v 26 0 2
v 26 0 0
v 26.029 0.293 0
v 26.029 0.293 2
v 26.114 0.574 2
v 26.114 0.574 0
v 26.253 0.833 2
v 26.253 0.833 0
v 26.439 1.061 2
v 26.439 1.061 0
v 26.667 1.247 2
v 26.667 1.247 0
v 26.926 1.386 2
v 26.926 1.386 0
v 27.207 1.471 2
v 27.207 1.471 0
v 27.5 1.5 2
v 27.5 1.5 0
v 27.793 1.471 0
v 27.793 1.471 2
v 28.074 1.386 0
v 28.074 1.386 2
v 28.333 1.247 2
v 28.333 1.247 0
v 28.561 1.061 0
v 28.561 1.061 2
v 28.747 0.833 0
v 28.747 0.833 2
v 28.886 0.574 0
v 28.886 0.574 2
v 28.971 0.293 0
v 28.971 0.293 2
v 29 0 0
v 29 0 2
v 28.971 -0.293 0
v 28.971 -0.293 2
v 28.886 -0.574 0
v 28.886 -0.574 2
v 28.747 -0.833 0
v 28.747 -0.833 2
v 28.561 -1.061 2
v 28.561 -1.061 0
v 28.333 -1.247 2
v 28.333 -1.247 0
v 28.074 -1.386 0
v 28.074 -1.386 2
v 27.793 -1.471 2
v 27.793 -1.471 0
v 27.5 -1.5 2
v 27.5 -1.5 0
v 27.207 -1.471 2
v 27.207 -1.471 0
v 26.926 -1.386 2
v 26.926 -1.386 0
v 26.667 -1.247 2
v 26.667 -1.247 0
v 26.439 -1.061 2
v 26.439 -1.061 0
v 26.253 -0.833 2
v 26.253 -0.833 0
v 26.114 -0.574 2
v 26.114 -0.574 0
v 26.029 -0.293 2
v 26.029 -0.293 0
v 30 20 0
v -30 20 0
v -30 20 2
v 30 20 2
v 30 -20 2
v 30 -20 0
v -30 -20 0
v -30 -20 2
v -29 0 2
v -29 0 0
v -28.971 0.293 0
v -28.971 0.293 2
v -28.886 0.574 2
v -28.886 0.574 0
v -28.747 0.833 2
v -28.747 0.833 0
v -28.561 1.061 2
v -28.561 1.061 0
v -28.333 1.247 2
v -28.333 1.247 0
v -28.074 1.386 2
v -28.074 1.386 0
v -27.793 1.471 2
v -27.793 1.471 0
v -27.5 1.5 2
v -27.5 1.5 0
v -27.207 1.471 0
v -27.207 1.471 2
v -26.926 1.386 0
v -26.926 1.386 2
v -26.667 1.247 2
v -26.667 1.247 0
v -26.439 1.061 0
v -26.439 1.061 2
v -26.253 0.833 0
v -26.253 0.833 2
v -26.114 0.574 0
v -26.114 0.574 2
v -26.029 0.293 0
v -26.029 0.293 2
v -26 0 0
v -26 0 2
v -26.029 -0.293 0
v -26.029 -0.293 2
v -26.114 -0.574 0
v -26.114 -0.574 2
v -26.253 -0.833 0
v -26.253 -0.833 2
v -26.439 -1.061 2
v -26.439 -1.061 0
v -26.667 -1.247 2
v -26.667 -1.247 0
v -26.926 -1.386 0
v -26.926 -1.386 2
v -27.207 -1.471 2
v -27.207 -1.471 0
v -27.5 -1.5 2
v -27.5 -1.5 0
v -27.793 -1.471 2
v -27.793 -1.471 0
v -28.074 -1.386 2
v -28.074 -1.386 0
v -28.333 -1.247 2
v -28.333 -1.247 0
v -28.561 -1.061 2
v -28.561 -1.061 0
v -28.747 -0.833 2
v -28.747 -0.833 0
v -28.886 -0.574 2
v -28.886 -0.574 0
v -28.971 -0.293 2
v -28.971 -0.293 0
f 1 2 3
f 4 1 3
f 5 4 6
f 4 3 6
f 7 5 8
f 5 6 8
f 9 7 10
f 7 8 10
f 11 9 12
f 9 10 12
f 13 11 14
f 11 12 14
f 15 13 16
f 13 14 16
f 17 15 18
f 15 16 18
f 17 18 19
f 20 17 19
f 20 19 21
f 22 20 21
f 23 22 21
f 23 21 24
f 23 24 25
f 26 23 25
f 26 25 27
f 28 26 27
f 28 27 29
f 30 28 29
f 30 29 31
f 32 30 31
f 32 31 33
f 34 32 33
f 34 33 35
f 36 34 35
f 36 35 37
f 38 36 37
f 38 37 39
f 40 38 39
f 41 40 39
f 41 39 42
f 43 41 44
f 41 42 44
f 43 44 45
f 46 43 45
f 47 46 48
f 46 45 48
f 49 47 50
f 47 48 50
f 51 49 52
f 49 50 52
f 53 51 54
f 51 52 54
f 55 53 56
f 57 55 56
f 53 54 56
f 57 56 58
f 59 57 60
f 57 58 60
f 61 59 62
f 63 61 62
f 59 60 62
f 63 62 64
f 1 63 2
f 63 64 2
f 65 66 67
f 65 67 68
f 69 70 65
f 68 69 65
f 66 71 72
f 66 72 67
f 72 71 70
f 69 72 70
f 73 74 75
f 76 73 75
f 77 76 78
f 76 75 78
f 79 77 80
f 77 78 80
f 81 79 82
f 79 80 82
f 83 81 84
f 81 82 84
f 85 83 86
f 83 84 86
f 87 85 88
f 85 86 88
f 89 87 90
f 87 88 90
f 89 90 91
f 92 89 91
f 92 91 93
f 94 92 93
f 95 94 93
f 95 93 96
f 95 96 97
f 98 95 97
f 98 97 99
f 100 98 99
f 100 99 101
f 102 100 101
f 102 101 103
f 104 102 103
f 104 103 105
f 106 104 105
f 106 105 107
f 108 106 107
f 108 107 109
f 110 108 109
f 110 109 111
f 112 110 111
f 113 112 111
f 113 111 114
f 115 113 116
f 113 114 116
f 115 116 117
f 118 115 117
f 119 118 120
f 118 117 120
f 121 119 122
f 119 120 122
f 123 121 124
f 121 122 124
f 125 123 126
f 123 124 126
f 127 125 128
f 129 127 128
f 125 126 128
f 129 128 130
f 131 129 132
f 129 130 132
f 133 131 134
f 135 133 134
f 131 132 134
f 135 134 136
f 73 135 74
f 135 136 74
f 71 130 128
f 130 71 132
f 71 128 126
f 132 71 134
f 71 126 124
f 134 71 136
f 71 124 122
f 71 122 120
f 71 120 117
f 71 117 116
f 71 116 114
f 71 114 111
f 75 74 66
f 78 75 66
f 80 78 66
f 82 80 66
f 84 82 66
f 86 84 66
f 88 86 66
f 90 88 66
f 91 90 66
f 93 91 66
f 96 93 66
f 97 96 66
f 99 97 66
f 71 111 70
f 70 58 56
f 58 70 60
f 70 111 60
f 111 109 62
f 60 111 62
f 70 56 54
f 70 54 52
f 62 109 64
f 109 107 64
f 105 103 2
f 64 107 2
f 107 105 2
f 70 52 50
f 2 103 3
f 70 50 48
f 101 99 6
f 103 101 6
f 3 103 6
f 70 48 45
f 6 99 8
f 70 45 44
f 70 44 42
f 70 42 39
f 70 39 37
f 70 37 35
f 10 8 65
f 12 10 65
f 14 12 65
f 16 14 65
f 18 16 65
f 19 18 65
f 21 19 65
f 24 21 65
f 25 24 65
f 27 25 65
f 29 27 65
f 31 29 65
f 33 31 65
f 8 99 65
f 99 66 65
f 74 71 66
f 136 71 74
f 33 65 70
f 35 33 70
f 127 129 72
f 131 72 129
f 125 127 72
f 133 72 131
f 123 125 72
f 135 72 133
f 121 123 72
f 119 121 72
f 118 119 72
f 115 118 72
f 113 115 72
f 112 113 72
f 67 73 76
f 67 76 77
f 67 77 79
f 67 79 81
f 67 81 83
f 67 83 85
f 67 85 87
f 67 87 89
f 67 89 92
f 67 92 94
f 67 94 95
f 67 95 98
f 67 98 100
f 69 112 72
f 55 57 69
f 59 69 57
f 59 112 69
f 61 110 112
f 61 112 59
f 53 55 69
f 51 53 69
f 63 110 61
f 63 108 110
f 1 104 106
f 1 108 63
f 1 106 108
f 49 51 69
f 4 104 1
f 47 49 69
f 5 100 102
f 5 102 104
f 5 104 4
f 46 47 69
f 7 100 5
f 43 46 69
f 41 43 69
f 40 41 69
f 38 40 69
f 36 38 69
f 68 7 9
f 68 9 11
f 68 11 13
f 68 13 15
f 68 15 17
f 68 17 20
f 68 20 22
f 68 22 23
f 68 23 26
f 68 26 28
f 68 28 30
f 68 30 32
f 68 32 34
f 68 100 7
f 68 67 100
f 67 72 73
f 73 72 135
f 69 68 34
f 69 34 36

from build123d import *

# Parameters (mm, degrees)
SKETCH1_W           = 60
SKETCH1_H           = 40
BOSS_EXTRUDE1_DEPTH = 2
CUT_EXTRUDE1_REACH  = 38.111
SKETCH2_R           = 1.5


with BuildPart() as part:
    # Sketch1 → Boss-Extrude1 (new body)
    with BuildSketch(Plane.XY):
        Rectangle(SKETCH1_W, SKETCH1_H)
    extrude(amount=BOSS_EXTRUDE1_DEPTH)

    # Sketch2 → Cut-Extrude1 (cut, up to next)
    with BuildSketch(Plane(origin=(0, 0, 0), x_dir=(-1, 0, 0), z_dir=(0, 0, -1)), mode=Mode.PRIVATE) as cut_extrude1_sk1:
        with Locations((27.5, 0)):
            Circle(SKETCH2_R)
    cut_extrude1_tool1 = extrude(cut_extrude1_sk1.sketch, amount=-CUT_EXTRUDE1_REACH, mode=Mode.PRIVATE) & part.part
    # Sketch2 → Cut-Extrude1 (cut, up to next)
    with BuildSketch(Plane(origin=(0, 0, 0), x_dir=(-1, 0, 0), z_dir=(0, 0, -1)), mode=Mode.PRIVATE) as cut_extrude1_sk2:
        with Locations((-27.5, 0)):
            Circle(SKETCH2_R)
    cut_extrude1_tool2 = extrude(cut_extrude1_sk2.sketch, amount=-CUT_EXTRUDE1_REACH, mode=Mode.PRIVATE) & part.part
    add(cut_extrude1_tool1.solids().sort_by_distance((-27.5, 0, 0))[0], mode=Mode.SUBTRACT)
    add(cut_extrude1_tool2.solids().sort_by_distance((27.5, 0, 0))[0], mode=Mode.SUBTRACT)


solid = part.part
